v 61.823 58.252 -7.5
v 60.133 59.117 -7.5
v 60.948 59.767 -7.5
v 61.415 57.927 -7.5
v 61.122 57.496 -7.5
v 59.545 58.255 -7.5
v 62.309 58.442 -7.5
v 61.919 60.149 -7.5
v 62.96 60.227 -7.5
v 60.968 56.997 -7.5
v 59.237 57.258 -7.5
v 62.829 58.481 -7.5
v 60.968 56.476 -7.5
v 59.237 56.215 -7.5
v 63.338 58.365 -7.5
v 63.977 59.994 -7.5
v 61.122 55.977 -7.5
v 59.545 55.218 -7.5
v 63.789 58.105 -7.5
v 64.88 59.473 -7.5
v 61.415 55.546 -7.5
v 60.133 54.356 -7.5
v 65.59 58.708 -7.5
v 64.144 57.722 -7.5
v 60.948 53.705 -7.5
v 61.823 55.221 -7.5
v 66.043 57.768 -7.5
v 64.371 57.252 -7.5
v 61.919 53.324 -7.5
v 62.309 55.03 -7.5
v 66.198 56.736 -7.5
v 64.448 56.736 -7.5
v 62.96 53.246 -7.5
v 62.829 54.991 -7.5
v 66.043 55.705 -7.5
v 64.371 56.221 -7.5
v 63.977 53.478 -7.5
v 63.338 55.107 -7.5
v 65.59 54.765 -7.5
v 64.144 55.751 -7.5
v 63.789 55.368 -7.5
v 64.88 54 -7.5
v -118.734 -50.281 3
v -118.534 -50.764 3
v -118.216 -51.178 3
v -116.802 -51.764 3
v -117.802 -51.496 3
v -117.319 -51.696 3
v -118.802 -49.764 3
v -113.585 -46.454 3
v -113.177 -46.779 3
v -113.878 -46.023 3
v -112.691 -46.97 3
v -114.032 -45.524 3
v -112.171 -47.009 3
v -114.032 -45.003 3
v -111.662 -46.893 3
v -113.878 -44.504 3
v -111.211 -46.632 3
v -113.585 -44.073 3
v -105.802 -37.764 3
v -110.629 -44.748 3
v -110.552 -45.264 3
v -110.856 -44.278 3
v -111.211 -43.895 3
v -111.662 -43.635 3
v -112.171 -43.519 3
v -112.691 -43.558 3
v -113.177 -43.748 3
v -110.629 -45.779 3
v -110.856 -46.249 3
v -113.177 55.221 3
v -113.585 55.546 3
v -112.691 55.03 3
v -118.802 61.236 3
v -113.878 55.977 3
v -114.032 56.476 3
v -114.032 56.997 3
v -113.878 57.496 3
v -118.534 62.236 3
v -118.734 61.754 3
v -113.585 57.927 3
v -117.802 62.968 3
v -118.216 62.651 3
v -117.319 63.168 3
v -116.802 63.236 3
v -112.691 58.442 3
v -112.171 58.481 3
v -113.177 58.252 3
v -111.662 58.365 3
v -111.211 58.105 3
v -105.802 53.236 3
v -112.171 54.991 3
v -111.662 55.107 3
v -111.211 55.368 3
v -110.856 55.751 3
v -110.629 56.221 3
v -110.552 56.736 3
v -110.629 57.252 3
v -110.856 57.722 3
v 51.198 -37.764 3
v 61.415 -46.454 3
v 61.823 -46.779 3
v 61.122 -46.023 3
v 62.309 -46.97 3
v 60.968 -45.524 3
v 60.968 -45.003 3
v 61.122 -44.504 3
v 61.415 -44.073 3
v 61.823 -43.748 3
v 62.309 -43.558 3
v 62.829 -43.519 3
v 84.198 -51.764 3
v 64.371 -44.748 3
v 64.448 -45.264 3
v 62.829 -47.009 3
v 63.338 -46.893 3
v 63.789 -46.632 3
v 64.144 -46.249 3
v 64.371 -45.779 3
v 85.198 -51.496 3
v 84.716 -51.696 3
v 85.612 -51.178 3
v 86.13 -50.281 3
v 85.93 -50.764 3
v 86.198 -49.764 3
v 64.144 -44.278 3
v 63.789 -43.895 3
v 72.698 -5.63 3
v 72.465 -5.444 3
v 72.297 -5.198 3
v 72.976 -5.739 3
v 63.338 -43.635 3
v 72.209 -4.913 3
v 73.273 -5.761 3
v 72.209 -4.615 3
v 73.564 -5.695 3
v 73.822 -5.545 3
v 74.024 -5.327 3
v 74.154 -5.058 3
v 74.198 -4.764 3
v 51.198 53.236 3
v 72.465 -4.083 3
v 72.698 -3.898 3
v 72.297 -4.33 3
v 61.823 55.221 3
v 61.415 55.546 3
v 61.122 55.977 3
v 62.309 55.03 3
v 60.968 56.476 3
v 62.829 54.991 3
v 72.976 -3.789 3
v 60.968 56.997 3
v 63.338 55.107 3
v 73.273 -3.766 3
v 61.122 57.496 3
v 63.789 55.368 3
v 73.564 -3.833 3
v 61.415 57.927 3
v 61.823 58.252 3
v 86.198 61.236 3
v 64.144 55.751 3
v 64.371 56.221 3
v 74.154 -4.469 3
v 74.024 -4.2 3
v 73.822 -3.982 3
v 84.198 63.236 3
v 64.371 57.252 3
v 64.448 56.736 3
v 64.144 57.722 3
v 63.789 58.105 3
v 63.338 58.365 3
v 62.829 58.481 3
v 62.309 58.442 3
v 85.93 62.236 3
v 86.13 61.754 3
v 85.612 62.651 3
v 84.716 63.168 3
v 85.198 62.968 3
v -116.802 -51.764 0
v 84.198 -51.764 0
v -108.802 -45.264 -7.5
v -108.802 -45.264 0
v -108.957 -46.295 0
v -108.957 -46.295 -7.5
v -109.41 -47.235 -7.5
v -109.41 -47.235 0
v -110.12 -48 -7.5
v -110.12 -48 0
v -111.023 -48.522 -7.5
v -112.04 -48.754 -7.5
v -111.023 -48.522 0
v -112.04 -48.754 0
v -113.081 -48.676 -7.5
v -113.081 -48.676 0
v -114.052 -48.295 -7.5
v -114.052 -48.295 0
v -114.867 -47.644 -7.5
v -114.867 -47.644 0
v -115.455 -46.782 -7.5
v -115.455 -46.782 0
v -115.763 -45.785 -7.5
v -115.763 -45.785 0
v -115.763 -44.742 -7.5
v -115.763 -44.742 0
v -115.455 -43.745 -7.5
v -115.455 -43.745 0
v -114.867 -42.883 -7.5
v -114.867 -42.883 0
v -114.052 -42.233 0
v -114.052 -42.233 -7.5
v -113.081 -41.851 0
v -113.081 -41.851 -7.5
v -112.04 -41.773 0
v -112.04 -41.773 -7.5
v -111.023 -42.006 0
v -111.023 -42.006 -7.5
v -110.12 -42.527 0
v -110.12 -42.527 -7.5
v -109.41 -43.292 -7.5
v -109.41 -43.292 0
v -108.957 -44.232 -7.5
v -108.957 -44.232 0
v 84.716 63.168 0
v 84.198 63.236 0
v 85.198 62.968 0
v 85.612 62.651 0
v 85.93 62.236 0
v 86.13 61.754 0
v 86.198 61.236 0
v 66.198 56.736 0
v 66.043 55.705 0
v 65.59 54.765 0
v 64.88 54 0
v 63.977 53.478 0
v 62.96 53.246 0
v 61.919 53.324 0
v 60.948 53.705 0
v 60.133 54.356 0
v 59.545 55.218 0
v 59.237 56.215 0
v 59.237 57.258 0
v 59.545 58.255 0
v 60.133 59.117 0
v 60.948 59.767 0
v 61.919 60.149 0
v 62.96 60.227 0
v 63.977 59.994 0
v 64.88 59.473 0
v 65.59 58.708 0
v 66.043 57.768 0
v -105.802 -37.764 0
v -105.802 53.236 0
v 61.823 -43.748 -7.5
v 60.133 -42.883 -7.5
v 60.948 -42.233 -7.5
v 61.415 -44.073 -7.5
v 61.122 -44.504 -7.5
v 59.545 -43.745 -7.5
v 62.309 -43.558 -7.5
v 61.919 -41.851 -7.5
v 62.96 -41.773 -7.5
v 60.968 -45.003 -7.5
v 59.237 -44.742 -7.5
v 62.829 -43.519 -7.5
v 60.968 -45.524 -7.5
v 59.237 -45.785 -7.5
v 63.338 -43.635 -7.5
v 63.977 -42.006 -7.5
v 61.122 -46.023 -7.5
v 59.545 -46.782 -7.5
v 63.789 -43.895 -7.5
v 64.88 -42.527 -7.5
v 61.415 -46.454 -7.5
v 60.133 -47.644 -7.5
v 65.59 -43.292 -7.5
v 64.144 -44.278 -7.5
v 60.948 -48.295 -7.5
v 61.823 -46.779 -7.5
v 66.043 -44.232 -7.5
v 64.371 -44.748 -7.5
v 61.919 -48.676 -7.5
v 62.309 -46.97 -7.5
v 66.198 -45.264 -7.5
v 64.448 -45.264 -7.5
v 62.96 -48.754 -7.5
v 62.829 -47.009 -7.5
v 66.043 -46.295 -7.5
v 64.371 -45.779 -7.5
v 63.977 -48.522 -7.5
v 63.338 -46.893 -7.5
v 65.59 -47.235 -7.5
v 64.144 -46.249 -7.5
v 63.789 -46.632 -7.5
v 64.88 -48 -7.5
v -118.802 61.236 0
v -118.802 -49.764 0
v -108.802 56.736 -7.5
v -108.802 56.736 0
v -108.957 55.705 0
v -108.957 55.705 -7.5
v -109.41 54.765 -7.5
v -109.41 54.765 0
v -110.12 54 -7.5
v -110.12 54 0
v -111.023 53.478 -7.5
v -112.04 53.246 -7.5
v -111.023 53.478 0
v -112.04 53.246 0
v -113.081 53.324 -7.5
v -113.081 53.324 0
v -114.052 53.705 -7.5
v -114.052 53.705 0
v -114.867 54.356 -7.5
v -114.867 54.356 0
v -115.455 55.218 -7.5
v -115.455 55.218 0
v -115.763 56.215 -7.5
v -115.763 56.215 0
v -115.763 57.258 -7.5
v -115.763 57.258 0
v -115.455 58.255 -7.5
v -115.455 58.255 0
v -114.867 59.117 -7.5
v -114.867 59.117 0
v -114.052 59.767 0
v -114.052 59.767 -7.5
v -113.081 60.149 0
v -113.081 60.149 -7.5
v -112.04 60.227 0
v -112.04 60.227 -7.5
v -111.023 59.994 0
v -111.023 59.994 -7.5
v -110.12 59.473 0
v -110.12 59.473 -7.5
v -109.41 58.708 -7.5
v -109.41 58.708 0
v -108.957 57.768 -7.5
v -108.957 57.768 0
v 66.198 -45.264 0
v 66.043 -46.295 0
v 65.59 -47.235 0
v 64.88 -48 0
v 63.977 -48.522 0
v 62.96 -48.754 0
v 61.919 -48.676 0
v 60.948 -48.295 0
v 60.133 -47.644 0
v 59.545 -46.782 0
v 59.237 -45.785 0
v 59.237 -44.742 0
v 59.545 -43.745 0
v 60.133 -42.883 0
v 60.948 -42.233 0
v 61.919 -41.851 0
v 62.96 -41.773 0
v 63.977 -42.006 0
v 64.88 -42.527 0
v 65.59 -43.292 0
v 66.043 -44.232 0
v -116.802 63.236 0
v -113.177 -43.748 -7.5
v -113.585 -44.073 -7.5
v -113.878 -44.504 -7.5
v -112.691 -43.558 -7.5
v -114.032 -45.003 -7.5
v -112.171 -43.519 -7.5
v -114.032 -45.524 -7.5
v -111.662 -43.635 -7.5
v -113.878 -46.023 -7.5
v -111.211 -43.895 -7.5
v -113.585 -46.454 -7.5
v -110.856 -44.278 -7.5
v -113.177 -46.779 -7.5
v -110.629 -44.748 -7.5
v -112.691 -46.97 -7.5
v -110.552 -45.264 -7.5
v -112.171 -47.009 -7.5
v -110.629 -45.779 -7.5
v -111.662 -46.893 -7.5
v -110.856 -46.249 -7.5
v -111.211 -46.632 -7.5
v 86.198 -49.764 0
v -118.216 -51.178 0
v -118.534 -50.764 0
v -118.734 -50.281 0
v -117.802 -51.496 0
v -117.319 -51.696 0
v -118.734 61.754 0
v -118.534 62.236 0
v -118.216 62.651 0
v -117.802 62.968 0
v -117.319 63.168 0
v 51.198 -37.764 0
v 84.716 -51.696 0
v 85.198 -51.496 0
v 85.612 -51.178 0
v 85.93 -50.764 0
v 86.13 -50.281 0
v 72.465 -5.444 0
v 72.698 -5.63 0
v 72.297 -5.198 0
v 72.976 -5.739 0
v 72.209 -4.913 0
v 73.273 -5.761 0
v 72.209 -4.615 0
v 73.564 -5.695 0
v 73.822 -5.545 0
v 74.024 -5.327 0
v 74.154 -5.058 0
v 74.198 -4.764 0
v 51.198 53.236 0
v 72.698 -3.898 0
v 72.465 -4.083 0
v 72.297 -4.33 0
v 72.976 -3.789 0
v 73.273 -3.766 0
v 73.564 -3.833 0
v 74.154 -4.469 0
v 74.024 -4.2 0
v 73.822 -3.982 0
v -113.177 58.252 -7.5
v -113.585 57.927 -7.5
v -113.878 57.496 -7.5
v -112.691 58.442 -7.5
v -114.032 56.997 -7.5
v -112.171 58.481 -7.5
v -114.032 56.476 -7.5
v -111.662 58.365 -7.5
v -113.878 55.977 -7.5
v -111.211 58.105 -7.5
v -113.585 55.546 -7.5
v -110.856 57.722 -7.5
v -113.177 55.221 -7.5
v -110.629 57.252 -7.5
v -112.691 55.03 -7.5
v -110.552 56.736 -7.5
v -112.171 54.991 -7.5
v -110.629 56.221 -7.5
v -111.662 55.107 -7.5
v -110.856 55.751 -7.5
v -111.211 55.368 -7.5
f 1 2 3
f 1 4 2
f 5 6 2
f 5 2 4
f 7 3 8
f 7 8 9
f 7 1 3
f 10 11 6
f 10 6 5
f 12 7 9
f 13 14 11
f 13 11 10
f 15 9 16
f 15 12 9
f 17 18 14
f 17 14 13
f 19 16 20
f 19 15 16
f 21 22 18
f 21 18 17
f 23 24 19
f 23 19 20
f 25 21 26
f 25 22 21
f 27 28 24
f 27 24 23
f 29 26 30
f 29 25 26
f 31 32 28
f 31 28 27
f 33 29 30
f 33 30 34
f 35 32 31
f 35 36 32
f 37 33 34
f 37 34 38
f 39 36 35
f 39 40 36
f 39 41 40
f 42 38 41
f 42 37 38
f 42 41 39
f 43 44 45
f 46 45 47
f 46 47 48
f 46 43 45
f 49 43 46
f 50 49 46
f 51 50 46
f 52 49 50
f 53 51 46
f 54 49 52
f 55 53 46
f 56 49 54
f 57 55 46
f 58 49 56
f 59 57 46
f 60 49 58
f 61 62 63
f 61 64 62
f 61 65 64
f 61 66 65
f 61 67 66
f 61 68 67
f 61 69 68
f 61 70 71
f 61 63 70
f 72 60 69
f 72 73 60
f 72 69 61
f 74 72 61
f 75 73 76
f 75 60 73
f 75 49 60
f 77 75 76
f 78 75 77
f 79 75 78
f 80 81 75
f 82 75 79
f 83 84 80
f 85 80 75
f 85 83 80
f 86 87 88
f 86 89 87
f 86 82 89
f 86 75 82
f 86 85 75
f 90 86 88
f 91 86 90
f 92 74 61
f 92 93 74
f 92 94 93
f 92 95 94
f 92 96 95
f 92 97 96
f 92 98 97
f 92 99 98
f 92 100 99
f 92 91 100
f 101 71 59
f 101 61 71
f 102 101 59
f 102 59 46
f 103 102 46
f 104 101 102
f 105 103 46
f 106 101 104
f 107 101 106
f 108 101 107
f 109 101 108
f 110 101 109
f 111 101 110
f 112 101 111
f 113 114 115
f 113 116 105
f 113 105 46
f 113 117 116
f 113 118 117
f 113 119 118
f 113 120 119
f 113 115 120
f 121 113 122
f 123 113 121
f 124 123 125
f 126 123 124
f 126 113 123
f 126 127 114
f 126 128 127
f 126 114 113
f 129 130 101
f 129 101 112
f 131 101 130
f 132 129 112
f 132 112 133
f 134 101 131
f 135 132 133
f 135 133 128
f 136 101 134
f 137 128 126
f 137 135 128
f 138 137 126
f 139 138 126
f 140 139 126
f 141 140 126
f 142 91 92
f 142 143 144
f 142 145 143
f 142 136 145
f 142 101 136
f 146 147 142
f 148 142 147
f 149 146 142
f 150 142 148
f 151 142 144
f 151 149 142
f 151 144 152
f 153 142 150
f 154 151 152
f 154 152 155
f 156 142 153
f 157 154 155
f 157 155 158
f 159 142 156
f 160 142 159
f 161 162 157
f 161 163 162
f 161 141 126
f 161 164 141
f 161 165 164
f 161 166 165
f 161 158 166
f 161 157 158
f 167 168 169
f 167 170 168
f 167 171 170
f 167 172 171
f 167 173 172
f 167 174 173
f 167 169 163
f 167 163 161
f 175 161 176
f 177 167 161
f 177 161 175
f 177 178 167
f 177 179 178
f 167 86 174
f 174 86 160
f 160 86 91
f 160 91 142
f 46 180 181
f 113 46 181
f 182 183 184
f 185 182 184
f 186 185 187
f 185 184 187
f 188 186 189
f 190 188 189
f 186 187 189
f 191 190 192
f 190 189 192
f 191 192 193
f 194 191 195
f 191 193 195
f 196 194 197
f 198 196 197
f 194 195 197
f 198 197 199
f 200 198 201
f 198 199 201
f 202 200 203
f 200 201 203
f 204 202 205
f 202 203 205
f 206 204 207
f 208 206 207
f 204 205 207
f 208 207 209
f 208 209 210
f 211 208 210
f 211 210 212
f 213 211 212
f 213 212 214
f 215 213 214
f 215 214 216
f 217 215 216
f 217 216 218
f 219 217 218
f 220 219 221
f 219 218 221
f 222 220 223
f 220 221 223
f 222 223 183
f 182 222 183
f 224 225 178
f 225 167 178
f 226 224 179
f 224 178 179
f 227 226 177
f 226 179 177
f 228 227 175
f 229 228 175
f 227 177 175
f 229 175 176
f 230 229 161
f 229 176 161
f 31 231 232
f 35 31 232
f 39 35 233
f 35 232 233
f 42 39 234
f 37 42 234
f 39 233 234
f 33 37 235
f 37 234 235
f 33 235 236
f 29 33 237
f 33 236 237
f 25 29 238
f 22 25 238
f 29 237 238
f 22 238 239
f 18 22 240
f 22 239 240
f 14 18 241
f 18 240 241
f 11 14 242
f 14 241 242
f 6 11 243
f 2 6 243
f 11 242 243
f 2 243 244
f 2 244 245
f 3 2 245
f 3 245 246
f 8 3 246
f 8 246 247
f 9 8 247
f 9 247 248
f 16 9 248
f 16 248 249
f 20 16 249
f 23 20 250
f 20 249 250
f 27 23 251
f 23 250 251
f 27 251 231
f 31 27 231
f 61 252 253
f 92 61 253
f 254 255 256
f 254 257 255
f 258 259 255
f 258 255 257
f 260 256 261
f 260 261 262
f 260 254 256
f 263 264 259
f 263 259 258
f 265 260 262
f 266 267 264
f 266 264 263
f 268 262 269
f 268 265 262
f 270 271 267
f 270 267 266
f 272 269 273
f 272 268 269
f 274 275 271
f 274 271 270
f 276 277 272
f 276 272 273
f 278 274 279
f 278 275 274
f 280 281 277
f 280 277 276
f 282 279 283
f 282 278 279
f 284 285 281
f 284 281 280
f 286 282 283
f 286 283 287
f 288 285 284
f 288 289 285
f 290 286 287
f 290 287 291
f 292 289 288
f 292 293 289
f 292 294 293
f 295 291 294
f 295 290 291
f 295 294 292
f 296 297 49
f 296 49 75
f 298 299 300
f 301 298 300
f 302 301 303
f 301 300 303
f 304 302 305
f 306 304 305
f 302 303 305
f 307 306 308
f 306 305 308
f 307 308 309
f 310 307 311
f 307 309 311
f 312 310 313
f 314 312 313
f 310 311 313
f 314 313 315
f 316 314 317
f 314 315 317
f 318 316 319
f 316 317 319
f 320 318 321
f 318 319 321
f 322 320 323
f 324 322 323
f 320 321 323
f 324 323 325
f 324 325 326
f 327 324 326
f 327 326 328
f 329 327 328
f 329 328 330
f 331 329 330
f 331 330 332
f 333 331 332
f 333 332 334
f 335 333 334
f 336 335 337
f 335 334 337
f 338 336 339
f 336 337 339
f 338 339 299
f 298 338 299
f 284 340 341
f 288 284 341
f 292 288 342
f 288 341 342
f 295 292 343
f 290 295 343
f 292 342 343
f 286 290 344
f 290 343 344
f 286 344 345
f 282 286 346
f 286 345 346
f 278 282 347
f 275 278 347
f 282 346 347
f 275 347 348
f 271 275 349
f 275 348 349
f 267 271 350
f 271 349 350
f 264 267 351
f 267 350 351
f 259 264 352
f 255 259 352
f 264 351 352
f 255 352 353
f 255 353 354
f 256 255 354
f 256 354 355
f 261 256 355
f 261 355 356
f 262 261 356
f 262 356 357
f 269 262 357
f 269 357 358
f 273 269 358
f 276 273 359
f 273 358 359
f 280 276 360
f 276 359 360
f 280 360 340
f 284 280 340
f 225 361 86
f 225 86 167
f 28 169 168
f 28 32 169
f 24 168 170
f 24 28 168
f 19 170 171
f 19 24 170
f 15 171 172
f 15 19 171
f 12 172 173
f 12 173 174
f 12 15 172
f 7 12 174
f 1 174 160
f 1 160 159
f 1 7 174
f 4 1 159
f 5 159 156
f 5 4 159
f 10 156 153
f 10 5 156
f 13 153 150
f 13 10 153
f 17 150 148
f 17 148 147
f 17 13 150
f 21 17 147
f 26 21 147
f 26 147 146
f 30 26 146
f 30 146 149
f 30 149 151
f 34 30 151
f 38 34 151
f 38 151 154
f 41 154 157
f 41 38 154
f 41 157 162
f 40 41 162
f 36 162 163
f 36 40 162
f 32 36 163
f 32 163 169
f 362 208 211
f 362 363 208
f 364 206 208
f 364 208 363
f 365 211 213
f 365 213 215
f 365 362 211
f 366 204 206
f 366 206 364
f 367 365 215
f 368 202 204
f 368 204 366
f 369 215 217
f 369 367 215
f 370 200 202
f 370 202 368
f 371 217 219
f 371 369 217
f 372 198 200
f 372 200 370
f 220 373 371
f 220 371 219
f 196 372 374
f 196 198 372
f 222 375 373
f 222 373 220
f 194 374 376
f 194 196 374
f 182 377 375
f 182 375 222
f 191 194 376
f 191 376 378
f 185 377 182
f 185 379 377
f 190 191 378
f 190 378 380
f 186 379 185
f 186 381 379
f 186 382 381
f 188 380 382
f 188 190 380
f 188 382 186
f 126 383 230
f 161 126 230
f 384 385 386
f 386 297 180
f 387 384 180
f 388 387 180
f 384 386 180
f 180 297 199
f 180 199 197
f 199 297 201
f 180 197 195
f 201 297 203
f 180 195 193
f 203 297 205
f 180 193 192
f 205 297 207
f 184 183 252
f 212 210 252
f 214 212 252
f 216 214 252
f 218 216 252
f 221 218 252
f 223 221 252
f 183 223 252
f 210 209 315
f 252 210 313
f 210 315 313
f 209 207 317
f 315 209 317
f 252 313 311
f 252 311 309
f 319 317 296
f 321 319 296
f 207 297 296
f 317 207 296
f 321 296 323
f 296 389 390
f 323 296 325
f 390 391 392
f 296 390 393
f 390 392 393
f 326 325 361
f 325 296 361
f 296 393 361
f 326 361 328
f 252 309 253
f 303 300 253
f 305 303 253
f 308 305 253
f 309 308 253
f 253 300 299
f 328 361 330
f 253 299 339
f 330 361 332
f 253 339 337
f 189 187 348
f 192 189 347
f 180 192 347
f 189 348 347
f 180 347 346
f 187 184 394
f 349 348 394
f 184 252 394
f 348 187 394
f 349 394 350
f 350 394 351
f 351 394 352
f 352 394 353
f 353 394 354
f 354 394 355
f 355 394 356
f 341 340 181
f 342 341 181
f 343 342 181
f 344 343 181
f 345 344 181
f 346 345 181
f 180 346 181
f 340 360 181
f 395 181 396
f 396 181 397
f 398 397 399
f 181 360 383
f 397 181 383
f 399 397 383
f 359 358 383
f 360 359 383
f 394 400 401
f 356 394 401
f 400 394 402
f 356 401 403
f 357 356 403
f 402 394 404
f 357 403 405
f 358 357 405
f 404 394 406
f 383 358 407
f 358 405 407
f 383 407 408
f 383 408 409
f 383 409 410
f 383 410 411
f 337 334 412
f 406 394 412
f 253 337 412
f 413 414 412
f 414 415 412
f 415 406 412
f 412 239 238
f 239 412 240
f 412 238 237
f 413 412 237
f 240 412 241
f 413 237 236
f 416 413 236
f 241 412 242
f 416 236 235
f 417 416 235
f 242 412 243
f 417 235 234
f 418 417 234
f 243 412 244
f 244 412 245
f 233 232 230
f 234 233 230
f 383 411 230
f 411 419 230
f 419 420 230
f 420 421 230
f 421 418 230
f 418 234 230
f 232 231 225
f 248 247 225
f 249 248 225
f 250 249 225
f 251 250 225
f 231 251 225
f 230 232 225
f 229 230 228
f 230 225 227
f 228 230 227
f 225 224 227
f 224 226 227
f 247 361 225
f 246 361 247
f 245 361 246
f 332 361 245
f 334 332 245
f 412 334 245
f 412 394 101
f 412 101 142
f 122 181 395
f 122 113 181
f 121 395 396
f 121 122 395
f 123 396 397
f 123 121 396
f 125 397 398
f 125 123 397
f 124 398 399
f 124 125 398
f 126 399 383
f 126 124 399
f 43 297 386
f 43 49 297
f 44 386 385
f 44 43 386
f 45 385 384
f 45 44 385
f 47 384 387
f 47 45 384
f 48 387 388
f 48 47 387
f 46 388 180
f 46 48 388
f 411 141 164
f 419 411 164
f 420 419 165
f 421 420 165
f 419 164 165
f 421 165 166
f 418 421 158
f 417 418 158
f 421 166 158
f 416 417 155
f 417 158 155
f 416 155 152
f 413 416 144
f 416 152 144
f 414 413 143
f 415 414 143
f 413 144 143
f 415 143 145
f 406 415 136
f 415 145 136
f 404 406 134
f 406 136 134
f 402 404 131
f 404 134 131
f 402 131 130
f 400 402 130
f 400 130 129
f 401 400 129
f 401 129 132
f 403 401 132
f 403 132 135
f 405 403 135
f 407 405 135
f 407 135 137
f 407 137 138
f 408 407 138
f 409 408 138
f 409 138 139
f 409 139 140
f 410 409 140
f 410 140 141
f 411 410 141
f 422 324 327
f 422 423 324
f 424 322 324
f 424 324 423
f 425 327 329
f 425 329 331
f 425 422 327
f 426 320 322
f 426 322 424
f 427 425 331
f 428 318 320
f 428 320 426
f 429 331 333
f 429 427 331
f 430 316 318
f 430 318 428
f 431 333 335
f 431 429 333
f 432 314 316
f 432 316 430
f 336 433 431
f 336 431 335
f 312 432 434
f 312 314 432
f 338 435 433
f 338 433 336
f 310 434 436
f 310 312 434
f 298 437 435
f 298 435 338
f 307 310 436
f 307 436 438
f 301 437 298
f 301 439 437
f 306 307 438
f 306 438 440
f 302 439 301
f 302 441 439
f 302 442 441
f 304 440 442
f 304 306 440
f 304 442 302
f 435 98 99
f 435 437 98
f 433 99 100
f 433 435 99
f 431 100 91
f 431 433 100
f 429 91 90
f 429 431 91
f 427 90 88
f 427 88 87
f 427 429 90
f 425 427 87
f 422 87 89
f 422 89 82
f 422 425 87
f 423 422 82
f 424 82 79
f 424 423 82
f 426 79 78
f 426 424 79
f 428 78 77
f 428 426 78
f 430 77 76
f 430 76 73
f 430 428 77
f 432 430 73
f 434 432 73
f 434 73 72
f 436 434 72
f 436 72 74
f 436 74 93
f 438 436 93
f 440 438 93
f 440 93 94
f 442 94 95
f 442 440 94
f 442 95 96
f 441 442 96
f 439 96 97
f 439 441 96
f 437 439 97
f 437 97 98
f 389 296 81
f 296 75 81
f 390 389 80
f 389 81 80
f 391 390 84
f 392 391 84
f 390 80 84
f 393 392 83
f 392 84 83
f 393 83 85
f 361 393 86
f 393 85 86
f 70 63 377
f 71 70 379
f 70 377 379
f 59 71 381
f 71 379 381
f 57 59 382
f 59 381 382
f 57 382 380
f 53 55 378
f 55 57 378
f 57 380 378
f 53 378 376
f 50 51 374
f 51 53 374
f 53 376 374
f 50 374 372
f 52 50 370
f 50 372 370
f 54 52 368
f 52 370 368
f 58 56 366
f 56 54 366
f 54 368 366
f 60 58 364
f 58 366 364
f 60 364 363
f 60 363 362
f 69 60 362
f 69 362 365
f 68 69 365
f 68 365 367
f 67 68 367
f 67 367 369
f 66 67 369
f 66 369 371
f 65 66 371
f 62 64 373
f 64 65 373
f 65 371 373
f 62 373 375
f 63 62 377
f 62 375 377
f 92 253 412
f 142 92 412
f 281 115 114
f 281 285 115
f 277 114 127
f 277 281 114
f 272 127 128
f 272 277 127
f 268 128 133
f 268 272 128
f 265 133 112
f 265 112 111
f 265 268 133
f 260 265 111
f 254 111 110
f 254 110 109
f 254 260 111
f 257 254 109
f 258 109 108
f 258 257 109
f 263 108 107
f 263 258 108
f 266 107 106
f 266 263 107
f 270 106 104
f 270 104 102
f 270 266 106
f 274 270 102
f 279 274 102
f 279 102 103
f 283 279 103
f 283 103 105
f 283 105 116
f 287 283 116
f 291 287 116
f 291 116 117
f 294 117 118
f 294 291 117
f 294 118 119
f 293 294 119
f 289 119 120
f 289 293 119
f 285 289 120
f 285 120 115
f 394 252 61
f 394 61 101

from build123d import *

# Parameters (mm, degrees)
F0_W      = 205
F0_H      = 115
F0_R      = 1.75
F0_W_2    = 157
F0_H_2    = 91
F1_DEPTH  = 3
F2_R      = 2
F3_DEPTH  = 25
F4_R      = 1
F5_DEPTH  = 25
F6_R      = 3.5
F7_DEPTH  = 7.5
F8_R      = 1.75
F9_DEPTH  = 25
F10_R     = 1.75
F11_DEPTH = 25
F12_R     = 1.75
F13_DEPTH = 25
F14_R     = 1.75
F15_DEPTH = 25


with BuildPart() as f1:
    # F0 (on Top) → F1 (new body)
    with BuildSketch(Plane.XY):
        with Locations((-16.301751, 5.736338)):
            Rectangle(F0_W, F0_H)
        with Locations((-112.301751, -45.263662)):
            Circle(F0_R, mode=Mode.SUBTRACT)
        with Locations((62.698249, -45.263662)):
            Circle(F0_R, mode=Mode.SUBTRACT)
        with Locations((-27.301751, 7.736338)):
            Rectangle(F0_W_2, F0_H_2, mode=Mode.SUBTRACT)
        with Locations((-112.301751, 56.736338)):
            Circle(F0_R, mode=Mode.SUBTRACT)
        with Locations((62.698249, 56.736338)):
            Circle(F0_R, mode=Mode.SUBTRACT)
    extrude(amount=F1_DEPTH)

    # F2
    f2_edges = [f1.edges().sort_by_distance(p)[0] for p in [
        (-118.801751, -51.763662, 1.5),
        (-118.801751, 63.236338, 1.5),
        (86.198249, -51.763662, 1.5),
        (86.198249, 63.236338, 1.5),
    ]]
    fillet(f2_edges, radius=F2_R)

    # F0 (on Top) → F3 (cut)
    with BuildSketch(Plane.XY):
        with Locations((-16.301751, 5.736338)):
            Rectangle(F0_W, F0_H)
        with Locations((-112.301751, -45.263662)):
            Circle(F0_R, mode=Mode.SUBTRACT)
        with Locations((62.698249, -45.263662)):
            Circle(F0_R, mode=Mode.SUBTRACT)
        with Locations((-27.301751, 7.736338)):
            Rectangle(F0_W_2, F0_H_2, mode=Mode.SUBTRACT)
        with Locations((-112.301751, 56.736338)):
            Circle(F0_R, mode=Mode.SUBTRACT)
        with Locations((62.698249, 56.736338)):
            Circle(F0_R, mode=Mode.SUBTRACT)
    extrude(amount=-F3_DEPTH, mode=Mode.SUBTRACT)

    # F4 (on face) → F5 (cut)
    with BuildSketch(Plane.XY.offset(3)):
        with Locations((73.198249, -4.763662)):
            Circle(F4_R)
    extrude(amount=-F5_DEPTH, mode=Mode.SUBTRACT)

    # F6 (on face) → F7 (join)
    with BuildSketch(Plane(origin=(0, 0, 0), x_dir=(1, 0, 0), z_dir=(0, 0, -1))):
        with Locations((-112.301751, 45.263662)):
            Circle(F6_R)
        with Locations((-112.301751, -56.736338)):
            Circle(F6_R)
        with Locations((62.698249, 45.263662)):
            Circle(F6_R)
        with Locations((62.698249, -56.736338)):
            Circle(F6_R)
    extrude(amount=F7_DEPTH)

    # F8 (on face) → F9 (cut)
    with BuildSketch(Plane(origin=(0, 0, -7.5), x_dir=(1, 0, 0), z_dir=(0, 0, -1))):
        with Locations((-112.301751, 45.263662)):
            Circle(F8_R)
    extrude(amount=-F9_DEPTH, mode=Mode.SUBTRACT)

    # F10 (on face) → F11 (cut)
    with BuildSketch(Plane(origin=(0, 0, -7.5), x_dir=(1, 0, 0), z_dir=(0, 0, -1))):
        with Locations((-112.301751, -56.736338)):
            Circle(F10_R)
    extrude(amount=-F11_DEPTH, mode=Mode.SUBTRACT)

    # F12 (on face) → F13 (cut)
    with BuildSketch(Plane(origin=(0, 0, -7.5), x_dir=(1, 0, 0), z_dir=(0, 0, -1))):
        with Locations((62.698249, -56.736338)):
            Circle(F12_R)
    extrude(amount=-F13_DEPTH, mode=Mode.SUBTRACT)

    # F14 (on face) → F15 (cut)
    with BuildSketch(Plane(origin=(0, 0, -7.5), x_dir=(1, 0, 0), z_dir=(0, 0, -1))):
        with Locations((62.698249, 45.263662)):
            Circle(F14_R)
    extrude(amount=-F15_DEPTH, mode=Mode.SUBTRACT)


solid = f1.part
